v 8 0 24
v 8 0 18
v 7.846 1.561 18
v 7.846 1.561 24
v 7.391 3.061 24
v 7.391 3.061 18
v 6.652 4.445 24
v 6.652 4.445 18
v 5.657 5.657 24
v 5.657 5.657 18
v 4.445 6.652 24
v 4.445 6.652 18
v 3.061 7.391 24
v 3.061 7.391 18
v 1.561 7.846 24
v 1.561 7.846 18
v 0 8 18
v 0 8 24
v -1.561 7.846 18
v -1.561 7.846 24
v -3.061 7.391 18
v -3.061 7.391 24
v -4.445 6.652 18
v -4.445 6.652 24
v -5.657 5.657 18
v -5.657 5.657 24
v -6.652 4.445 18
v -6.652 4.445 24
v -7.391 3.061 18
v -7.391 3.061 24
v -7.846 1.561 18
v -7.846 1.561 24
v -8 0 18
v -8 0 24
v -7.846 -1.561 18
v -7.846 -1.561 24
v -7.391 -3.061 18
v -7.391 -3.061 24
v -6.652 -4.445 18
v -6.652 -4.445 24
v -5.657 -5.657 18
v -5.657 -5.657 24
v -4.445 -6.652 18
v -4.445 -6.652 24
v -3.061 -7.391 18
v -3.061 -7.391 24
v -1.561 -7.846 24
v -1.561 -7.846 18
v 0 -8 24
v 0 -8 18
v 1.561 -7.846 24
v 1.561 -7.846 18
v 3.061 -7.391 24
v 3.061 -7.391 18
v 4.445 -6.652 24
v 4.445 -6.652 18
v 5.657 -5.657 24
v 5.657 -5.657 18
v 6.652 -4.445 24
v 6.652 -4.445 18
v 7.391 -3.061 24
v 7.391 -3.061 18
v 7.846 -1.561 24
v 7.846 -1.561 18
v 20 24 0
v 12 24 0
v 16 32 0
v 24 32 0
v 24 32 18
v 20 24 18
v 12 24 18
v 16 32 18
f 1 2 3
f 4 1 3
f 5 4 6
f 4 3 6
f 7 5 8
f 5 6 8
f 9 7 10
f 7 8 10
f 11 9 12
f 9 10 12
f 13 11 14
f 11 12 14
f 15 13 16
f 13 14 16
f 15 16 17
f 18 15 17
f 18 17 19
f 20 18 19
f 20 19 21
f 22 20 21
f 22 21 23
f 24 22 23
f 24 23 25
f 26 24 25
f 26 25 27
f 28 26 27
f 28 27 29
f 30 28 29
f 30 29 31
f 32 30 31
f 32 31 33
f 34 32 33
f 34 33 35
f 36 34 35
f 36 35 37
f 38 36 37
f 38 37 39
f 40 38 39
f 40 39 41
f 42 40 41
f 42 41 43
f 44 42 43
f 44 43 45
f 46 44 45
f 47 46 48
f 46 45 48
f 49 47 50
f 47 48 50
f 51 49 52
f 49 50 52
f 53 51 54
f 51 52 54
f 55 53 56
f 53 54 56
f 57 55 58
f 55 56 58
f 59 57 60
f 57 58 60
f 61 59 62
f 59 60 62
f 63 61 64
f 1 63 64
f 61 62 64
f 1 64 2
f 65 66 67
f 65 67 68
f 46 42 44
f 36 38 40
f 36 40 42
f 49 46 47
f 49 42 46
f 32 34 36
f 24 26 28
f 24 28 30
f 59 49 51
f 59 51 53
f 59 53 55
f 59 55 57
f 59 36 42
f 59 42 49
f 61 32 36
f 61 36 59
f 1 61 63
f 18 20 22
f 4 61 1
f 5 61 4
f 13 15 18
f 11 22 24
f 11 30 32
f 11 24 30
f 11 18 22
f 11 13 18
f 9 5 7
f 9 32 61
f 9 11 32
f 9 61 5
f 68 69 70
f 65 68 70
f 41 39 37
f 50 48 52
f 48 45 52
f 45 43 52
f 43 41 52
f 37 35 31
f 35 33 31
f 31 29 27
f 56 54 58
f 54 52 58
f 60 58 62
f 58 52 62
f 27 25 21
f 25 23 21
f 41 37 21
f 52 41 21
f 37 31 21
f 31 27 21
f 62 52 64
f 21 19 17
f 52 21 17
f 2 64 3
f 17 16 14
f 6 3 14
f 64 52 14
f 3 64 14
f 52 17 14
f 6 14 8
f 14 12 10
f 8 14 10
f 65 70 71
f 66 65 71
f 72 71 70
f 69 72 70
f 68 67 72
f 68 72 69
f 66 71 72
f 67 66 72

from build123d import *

# Parameters (mm, degrees)
SKETCH_1_R          = 8
EXTRUDE_1_DEPTH     = 24
SKETCH_2_R          = 42
EXTRUDE_2_DEPTH     = 18
SKETCH_3_OUTSIDE_W  = 110.238
SKETCH_3_OUTSIDE_H  = 110.238
CUT_EXTRUDE_1_DEPTH = 63.064482597


with BuildPart() as part:
    # 草图1 → 凸台-拉伸1 (new body)
    with BuildSketch(Plane.XY):
        Circle(SKETCH_1_R)
    extrude(amount=EXTRUDE_1_DEPTH)

    # 草图2 → 凸台-拉伸2 (add)
    with BuildSketch(Plane.XY):
        Circle(SKETCH_2_R)
    extrude(amount=EXTRUDE_2_DEPTH)

    # 草图3 outside → 切除-拉伸1 (cut, through all)
    with BuildSketch(Plane.XY.offset(18)):
        Rectangle(SKETCH_3_OUTSIDE_W, SKETCH_3_OUTSIDE_H)
        Polygon((16, 32), (24, 32), (20, 24), (12, 24), align=None, mode=Mode.SUBTRACT)
    extrude(amount=-CUT_EXTRUDE_1_DEPTH, mode=Mode.SUBTRACT)


with BuildPart() as cut_extrude_1_piece_1:
    # of the separate pieces the step leaves, piece 1, a body of its own (cut_extrude_1_pieces)
    add(part.part.solids().sort_by_distance((8, 0, 18))[0])


with BuildPart() as cut_extrude_1_piece_2:
    # of the separate pieces the step leaves, piece 2, a body of its own (cut_extrude_1_pieces)
    add(part.part.solids().sort_by_distance((16, 32, 0))[0])


solid = Compound([cut_extrude_1_piece_1.part, cut_extrude_1_piece_2.part])
